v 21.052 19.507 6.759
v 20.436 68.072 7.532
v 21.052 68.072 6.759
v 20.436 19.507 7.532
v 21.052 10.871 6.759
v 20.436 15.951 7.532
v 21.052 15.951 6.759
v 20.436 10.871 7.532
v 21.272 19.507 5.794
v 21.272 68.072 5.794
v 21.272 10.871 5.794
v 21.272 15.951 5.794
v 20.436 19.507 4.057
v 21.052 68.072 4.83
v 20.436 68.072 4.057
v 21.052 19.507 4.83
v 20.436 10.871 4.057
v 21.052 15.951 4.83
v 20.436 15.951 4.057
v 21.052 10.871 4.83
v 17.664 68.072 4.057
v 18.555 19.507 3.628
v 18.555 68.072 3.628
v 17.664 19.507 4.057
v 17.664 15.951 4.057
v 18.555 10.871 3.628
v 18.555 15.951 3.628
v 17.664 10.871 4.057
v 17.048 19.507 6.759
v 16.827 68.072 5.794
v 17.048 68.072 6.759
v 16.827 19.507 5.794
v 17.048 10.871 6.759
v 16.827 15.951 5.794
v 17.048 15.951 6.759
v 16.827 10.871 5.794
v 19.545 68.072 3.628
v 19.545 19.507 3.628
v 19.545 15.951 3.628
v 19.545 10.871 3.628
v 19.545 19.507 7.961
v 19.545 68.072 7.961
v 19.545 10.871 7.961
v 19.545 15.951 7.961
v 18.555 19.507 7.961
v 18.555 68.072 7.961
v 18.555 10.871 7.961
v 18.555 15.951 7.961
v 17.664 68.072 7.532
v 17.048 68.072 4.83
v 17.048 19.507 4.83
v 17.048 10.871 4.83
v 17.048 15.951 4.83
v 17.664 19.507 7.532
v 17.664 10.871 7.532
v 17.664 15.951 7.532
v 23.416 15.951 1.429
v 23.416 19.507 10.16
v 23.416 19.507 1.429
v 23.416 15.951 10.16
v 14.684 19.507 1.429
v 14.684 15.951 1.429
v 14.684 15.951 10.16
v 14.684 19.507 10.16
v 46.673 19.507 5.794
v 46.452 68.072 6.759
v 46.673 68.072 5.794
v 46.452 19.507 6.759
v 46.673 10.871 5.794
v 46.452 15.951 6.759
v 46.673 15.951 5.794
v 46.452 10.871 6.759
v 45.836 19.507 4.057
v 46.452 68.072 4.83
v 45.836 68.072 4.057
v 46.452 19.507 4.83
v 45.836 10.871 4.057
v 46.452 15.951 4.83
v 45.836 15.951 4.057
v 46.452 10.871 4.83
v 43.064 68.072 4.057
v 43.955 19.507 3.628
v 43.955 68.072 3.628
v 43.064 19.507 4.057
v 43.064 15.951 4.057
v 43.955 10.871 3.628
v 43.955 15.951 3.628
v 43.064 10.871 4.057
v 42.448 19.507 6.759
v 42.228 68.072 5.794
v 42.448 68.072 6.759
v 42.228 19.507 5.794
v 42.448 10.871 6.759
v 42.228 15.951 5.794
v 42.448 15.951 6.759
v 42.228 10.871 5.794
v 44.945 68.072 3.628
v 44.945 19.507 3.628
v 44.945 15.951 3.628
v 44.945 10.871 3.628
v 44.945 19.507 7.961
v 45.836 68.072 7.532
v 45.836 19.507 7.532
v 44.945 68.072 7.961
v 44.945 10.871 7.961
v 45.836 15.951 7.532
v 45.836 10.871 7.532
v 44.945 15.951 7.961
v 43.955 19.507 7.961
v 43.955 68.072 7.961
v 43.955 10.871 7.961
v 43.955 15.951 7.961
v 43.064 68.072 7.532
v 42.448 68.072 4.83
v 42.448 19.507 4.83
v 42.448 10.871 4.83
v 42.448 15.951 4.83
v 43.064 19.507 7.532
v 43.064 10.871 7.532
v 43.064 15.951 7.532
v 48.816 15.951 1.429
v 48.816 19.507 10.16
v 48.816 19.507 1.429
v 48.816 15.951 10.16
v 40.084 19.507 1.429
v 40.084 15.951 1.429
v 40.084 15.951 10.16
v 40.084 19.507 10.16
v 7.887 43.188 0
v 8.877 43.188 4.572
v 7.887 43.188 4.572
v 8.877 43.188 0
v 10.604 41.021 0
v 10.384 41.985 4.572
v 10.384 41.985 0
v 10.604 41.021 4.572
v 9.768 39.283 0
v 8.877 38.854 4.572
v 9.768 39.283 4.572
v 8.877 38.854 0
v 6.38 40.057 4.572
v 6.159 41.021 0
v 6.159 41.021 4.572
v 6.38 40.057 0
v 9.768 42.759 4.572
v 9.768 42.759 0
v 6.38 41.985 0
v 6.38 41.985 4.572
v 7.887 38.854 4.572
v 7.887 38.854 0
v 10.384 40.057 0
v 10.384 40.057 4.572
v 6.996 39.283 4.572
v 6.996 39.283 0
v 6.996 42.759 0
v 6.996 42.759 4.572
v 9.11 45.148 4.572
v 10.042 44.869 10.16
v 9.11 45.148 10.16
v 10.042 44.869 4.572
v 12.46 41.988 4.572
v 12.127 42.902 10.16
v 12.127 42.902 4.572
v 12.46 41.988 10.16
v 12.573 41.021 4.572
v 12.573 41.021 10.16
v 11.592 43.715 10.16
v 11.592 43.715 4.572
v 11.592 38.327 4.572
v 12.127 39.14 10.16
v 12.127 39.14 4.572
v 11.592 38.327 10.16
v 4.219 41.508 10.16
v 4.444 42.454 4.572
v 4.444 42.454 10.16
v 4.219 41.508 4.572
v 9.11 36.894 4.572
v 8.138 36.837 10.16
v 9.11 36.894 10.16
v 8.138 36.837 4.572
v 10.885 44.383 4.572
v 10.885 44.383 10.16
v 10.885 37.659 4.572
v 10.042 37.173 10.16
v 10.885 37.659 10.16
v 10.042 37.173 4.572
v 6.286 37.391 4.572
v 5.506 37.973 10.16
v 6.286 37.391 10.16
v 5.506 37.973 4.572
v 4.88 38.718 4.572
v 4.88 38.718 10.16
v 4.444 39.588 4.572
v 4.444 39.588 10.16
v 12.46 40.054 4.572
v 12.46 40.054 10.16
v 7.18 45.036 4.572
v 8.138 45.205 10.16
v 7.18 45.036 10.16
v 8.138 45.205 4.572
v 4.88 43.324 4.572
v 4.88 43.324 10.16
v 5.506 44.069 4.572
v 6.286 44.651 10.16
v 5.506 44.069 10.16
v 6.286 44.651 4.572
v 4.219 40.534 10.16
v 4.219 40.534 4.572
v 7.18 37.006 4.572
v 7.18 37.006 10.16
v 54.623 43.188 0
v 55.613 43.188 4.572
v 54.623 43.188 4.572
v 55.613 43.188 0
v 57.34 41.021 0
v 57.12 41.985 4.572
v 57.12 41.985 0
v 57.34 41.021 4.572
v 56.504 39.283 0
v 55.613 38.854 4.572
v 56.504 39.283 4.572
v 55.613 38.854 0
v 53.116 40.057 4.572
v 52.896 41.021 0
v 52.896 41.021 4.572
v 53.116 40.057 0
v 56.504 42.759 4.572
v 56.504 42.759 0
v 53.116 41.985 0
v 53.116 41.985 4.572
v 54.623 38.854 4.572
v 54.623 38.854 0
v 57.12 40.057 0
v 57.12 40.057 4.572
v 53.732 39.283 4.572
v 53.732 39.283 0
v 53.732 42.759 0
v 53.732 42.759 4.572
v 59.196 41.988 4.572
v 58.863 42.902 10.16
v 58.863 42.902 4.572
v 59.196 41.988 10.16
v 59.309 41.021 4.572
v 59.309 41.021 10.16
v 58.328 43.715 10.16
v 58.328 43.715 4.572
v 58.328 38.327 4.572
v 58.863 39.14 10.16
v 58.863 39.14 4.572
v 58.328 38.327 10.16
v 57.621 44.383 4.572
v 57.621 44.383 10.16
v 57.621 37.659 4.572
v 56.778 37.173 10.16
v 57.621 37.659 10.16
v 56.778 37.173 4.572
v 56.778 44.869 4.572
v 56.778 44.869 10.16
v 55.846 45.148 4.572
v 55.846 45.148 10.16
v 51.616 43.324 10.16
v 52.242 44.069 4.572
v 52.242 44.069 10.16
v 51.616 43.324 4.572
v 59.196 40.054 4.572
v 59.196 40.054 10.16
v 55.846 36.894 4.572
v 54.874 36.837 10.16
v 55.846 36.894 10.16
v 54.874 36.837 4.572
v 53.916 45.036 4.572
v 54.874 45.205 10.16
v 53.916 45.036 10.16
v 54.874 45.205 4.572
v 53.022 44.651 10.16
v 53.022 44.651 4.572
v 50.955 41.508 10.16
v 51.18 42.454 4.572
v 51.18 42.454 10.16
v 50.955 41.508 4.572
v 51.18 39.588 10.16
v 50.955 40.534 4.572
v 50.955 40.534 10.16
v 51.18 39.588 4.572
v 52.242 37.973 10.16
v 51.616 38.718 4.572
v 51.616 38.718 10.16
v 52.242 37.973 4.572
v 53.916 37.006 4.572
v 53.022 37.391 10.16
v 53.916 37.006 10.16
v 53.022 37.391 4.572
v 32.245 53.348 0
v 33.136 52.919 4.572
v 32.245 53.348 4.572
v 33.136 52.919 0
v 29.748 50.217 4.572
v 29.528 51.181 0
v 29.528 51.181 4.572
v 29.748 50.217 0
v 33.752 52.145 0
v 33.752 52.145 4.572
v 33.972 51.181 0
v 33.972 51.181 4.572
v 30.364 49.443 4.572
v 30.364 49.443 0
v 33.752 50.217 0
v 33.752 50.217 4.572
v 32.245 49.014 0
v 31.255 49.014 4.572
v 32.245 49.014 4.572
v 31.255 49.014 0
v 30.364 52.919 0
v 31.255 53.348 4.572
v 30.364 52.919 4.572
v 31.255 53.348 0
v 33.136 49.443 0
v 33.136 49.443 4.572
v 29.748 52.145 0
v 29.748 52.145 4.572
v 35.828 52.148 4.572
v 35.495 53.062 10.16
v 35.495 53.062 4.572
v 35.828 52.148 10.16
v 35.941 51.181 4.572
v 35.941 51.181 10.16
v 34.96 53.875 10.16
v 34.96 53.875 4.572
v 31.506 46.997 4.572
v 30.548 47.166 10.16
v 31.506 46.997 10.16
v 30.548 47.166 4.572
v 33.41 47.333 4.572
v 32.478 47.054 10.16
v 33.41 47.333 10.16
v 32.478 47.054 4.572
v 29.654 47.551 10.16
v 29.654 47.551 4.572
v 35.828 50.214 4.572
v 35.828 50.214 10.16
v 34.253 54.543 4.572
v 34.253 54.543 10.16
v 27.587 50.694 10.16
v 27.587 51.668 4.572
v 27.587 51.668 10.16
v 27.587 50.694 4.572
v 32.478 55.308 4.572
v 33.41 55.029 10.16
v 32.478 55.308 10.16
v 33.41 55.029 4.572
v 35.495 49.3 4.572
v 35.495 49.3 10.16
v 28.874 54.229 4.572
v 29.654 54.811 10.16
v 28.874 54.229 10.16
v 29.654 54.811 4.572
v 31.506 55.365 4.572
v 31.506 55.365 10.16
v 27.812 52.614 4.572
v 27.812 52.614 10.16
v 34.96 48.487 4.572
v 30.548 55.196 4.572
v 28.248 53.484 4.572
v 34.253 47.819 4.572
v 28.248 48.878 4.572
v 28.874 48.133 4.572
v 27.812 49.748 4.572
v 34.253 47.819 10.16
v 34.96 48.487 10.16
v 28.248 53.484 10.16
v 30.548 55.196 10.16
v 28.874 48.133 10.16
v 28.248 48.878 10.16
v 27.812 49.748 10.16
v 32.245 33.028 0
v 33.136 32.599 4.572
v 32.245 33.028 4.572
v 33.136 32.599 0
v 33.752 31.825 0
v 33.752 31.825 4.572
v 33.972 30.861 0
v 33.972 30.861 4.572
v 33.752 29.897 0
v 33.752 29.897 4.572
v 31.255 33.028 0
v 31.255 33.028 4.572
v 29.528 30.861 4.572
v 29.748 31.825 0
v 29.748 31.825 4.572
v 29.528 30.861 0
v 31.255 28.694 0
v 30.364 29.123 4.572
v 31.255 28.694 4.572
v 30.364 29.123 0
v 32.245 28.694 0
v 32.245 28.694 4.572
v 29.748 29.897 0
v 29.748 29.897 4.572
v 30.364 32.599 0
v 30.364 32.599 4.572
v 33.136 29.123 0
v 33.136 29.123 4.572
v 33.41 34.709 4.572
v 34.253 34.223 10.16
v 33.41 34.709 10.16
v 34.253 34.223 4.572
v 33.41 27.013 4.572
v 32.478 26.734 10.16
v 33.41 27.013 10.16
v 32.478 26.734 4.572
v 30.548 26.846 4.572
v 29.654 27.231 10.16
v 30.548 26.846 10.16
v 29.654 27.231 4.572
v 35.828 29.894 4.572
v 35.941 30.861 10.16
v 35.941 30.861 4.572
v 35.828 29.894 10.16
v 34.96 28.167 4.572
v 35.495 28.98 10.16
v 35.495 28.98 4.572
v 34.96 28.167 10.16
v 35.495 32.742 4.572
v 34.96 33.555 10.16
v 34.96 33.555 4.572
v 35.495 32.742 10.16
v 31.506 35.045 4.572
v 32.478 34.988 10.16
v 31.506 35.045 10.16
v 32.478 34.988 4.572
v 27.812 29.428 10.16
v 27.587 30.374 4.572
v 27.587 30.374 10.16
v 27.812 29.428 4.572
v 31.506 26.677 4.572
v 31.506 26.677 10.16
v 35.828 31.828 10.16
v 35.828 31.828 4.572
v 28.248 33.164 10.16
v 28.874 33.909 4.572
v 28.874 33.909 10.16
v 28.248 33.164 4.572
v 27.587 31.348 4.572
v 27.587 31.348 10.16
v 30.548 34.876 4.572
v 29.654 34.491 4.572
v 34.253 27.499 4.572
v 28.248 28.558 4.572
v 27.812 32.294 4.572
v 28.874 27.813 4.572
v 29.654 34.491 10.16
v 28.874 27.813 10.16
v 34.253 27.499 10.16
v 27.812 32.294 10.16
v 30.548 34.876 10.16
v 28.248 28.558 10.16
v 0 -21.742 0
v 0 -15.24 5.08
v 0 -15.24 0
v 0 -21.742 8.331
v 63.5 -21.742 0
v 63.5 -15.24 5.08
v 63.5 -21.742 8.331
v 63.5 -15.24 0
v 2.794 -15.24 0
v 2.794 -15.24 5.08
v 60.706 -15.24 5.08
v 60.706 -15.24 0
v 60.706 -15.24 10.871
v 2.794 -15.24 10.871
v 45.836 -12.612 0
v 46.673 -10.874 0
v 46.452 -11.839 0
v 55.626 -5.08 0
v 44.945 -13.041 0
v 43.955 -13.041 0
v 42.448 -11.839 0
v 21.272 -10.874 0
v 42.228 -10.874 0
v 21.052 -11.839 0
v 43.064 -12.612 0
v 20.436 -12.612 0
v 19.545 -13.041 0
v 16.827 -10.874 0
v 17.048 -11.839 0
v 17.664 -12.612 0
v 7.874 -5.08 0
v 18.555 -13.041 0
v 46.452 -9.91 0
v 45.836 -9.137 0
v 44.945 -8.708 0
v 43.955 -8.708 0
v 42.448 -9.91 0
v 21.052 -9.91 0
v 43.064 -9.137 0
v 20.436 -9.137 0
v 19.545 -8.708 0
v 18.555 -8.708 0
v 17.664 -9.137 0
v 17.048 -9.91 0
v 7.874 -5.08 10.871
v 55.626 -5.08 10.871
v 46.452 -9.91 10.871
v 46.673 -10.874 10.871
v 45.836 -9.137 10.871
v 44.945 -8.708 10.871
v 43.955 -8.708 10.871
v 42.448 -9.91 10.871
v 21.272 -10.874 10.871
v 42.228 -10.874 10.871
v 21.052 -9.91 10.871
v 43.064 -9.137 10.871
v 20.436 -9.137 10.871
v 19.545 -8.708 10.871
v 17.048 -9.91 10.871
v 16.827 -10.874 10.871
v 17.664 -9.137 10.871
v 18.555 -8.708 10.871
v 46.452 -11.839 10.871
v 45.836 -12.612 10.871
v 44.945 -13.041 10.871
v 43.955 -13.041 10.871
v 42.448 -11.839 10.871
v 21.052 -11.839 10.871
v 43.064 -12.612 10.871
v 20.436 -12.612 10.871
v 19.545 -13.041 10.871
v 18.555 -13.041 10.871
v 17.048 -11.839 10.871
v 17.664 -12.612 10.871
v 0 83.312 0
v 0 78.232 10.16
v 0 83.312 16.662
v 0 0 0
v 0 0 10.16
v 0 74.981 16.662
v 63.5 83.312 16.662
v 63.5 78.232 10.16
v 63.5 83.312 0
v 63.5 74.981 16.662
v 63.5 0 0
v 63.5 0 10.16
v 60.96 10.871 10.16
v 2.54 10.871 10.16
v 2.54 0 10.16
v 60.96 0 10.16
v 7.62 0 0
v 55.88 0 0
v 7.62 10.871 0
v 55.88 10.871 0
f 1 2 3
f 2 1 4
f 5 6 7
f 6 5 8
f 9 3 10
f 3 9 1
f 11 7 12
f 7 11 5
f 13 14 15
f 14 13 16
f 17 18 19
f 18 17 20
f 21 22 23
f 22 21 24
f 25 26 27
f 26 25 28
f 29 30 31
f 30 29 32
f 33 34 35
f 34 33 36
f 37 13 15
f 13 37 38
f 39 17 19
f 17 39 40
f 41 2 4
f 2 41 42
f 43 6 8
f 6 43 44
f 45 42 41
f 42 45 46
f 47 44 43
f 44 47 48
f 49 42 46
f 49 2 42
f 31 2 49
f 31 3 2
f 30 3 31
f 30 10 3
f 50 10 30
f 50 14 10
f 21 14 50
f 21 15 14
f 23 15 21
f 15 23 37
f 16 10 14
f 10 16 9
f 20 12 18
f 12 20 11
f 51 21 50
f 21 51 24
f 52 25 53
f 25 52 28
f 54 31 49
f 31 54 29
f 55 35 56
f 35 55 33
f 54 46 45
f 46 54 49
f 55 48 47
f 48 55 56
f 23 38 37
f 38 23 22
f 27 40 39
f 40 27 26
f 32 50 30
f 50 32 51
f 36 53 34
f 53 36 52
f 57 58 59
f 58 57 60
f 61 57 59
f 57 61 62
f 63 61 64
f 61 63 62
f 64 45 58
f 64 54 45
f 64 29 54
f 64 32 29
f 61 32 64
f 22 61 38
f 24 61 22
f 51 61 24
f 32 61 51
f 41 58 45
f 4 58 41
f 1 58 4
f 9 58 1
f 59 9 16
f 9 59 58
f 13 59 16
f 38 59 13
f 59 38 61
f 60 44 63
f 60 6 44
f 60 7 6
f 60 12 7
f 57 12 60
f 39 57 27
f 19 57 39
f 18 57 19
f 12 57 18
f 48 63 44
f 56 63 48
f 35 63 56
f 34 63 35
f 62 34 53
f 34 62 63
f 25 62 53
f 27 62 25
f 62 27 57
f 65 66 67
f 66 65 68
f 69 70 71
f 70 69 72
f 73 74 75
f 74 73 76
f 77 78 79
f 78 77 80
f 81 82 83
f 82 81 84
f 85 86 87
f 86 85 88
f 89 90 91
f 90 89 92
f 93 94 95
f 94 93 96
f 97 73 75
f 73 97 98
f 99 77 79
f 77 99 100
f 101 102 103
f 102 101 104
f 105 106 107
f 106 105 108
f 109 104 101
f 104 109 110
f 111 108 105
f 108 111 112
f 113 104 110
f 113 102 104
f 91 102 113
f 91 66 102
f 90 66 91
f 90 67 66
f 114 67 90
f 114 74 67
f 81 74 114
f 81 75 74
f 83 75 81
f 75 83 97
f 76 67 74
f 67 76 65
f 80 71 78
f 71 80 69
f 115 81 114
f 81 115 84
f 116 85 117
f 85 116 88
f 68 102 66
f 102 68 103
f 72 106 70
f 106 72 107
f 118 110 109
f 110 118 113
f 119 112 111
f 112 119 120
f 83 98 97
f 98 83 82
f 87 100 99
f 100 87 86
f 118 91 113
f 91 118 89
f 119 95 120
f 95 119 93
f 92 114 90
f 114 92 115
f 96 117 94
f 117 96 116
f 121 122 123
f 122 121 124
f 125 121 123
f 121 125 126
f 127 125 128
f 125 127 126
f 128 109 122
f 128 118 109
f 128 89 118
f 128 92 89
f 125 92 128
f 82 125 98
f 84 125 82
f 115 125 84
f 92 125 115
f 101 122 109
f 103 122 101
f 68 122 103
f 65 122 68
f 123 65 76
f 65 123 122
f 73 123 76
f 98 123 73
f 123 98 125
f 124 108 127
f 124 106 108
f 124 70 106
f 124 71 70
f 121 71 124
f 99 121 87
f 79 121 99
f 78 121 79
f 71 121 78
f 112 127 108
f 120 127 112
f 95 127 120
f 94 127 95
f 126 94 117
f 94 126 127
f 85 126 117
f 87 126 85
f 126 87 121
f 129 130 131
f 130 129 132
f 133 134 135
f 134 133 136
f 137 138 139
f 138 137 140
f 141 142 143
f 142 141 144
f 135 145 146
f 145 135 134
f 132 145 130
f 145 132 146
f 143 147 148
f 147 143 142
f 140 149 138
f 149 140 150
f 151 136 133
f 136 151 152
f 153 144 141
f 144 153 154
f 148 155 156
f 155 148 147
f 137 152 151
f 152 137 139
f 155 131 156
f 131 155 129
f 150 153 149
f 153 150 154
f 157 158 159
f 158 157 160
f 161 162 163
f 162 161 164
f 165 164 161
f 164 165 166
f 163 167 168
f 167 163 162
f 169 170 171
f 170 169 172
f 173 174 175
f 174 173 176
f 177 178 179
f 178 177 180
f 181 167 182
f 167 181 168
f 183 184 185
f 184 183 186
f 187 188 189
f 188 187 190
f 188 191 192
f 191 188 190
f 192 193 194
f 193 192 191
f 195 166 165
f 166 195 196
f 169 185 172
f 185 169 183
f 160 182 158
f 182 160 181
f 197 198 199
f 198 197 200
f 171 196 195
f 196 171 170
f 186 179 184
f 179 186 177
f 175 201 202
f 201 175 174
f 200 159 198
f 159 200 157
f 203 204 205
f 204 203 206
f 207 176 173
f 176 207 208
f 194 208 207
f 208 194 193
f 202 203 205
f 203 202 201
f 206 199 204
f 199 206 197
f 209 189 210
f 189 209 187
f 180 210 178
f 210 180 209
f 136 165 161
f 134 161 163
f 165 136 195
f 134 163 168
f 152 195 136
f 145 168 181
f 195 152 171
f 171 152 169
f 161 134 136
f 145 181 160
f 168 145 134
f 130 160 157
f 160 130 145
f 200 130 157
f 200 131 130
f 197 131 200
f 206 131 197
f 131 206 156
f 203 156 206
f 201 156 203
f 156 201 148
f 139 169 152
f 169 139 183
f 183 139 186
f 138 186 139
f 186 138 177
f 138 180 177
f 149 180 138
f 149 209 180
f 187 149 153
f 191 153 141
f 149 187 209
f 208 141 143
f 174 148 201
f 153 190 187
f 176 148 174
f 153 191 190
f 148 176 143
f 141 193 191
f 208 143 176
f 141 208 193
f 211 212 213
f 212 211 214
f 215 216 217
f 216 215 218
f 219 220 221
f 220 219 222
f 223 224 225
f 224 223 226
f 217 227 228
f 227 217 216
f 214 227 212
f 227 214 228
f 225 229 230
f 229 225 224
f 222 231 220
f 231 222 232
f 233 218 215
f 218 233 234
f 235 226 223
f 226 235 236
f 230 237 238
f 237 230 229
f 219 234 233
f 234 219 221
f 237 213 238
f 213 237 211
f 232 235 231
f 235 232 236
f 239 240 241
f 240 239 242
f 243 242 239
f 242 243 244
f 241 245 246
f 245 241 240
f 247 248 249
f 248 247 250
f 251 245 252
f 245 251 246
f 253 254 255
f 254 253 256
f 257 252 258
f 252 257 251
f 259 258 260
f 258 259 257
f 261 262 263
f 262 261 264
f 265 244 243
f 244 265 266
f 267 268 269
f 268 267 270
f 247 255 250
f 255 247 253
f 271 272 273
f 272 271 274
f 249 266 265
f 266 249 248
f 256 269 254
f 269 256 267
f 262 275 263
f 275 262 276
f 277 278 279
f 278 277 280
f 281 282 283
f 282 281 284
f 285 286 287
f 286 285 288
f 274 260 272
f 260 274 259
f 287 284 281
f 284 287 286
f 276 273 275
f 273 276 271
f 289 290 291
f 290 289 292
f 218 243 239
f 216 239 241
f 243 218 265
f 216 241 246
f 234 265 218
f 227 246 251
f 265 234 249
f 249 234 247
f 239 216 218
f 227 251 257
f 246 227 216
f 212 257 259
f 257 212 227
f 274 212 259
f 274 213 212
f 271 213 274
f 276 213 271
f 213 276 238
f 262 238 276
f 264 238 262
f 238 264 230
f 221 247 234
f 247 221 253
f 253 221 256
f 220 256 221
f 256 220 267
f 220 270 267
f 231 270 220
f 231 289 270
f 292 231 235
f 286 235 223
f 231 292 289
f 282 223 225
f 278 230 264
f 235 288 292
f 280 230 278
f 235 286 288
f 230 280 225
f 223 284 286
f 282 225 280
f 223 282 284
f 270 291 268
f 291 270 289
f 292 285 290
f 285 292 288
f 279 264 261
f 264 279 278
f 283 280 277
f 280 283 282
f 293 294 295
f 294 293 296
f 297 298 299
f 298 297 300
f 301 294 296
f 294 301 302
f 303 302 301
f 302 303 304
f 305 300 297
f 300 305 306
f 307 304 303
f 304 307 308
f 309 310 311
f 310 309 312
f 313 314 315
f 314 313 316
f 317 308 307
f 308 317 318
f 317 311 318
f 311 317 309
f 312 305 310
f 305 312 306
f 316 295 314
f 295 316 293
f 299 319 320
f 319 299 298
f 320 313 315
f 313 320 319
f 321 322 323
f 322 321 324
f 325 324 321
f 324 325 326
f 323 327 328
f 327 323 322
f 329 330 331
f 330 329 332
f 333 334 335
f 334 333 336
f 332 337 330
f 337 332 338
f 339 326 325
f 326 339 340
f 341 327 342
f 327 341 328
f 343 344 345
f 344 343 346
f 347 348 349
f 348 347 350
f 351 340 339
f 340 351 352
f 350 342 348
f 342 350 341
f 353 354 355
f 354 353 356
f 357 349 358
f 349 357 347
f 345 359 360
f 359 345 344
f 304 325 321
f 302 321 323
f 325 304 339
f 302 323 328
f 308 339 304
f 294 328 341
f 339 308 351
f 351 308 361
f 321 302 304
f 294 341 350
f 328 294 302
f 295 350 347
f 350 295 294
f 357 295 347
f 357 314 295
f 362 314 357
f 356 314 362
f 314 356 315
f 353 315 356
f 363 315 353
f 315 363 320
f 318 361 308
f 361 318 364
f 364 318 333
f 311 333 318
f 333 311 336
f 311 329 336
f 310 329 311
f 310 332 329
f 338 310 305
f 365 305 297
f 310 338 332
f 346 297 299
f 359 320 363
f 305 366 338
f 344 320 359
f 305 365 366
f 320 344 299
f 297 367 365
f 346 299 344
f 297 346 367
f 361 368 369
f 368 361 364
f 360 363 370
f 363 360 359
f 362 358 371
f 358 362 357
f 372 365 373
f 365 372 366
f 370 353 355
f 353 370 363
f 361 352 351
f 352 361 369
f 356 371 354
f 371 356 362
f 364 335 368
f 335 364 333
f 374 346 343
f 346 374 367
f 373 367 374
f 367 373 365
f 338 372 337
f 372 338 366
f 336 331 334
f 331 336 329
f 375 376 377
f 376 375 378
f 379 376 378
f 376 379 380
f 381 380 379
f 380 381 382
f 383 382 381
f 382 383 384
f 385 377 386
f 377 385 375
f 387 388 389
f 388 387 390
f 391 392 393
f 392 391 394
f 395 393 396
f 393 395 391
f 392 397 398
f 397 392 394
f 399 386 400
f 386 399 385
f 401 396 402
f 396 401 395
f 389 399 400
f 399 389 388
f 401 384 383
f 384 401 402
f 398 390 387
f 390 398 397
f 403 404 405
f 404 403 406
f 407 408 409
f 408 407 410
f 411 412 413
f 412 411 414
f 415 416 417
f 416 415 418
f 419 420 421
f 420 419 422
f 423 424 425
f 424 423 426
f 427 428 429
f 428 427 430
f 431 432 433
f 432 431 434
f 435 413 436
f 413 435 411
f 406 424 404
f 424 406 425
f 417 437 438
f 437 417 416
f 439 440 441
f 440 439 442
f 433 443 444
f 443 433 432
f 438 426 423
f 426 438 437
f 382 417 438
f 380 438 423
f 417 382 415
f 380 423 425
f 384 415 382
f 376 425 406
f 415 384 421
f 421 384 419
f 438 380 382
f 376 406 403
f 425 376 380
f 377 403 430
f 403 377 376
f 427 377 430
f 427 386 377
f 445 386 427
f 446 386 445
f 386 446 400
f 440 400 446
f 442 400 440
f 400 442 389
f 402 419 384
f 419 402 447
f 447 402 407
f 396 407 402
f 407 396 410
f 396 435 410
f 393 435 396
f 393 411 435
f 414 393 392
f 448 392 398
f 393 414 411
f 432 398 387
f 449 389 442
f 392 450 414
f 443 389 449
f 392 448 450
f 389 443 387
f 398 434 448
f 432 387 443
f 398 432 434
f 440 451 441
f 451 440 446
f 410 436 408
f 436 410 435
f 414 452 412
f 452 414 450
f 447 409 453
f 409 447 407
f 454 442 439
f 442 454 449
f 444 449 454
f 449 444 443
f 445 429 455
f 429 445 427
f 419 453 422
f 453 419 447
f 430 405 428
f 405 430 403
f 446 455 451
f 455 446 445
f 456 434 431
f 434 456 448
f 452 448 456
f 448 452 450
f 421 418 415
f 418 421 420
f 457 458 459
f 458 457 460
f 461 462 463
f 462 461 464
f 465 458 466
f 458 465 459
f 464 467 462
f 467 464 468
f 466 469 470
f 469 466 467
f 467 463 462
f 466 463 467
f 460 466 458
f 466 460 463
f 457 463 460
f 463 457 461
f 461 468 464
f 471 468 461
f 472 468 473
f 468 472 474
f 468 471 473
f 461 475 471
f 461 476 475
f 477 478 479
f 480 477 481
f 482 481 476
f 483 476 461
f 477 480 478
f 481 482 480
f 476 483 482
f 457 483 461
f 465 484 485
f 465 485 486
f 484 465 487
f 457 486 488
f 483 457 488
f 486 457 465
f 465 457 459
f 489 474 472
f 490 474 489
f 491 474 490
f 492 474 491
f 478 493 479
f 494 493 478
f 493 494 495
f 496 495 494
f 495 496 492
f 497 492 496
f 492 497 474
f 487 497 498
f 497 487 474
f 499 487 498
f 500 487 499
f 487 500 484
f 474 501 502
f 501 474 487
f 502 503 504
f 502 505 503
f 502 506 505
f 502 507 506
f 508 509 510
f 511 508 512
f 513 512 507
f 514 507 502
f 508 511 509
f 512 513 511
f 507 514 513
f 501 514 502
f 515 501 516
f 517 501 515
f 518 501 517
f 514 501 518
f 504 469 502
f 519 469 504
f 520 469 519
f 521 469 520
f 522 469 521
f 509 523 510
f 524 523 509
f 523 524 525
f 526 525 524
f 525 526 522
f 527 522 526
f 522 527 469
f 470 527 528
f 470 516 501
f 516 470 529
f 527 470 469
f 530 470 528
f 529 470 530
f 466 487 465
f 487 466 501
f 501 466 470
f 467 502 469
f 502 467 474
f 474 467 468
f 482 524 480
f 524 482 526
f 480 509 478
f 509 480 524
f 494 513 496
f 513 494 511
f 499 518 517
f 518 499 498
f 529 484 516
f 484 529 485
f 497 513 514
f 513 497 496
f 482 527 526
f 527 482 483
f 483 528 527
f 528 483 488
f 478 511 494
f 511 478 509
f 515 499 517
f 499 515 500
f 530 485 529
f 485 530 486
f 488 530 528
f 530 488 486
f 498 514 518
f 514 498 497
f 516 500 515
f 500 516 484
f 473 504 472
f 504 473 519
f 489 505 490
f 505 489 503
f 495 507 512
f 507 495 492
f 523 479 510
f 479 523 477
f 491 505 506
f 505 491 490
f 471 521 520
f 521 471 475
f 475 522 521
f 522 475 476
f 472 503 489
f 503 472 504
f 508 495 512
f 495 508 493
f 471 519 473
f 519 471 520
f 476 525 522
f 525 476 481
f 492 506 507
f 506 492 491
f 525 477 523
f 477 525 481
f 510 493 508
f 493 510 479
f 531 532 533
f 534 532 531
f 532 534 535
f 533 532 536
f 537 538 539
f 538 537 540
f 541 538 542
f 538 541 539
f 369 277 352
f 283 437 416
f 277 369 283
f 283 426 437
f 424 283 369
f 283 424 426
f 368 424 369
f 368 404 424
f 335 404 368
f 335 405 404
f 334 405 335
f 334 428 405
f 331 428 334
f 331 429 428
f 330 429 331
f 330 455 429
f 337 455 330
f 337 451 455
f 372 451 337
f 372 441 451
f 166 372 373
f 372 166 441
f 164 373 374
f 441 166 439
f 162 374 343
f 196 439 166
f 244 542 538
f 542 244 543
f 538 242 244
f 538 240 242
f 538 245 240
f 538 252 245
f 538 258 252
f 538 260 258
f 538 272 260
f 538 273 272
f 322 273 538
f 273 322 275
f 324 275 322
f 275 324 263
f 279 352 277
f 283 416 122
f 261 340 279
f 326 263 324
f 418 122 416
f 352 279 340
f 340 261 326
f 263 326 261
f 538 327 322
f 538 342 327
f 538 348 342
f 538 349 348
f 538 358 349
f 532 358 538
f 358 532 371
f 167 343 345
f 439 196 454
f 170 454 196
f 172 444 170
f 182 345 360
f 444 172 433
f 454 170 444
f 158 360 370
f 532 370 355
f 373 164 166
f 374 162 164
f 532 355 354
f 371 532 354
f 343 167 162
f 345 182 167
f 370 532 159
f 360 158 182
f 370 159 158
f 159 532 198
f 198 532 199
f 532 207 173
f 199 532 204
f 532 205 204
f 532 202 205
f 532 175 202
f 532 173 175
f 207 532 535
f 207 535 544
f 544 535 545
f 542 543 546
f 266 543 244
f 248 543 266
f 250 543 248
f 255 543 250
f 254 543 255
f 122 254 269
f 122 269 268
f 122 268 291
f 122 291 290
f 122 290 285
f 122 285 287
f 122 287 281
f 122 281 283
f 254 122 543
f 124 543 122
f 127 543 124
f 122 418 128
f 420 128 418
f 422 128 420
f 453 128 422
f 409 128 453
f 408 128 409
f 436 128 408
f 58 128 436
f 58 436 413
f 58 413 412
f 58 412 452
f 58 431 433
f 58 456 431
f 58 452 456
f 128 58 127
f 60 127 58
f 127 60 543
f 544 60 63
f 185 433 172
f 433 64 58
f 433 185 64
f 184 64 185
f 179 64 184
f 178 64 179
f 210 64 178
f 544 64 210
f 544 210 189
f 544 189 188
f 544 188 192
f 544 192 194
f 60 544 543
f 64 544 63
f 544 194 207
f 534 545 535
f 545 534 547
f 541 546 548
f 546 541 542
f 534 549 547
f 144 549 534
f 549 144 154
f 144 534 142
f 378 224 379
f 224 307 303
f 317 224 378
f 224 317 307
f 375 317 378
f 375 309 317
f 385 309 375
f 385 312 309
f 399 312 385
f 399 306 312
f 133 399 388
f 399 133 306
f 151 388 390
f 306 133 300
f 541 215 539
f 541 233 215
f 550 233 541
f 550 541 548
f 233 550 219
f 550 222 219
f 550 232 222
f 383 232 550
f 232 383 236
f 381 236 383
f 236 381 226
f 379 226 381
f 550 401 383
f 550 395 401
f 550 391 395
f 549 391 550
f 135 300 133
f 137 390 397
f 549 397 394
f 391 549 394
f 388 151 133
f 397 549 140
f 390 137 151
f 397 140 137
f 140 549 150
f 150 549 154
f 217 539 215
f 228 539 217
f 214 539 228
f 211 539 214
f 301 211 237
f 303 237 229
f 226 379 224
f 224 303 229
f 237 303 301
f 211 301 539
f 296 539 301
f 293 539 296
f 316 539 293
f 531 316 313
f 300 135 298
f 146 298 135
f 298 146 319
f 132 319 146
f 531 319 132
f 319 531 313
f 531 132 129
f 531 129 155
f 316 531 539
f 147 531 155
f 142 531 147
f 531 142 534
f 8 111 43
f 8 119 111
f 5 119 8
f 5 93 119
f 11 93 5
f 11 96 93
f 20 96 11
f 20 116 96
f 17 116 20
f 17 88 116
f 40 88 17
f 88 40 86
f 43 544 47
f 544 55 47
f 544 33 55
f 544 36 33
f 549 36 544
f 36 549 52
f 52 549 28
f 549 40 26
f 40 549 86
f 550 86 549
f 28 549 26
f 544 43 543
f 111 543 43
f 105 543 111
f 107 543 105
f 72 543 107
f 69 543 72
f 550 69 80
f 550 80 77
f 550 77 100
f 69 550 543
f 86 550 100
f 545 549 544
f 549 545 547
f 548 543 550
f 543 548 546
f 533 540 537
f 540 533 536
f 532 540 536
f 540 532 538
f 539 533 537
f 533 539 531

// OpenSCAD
//////////////////////////////////////////////////////
// Vixen-style dovetail clamp
//
// Designed for attached relatively light-weight 
// equipment, like a finder or guide scope, to a
// Vixen-style dovetail plate.  
//
// The length of the clamp is set by the clamp_length
// parameter.  Counterbored screw holes for equipment
// attachment are specified in the screw_holes[] 
// vector.  
// 
// The various holes are sized for US #8 machine screw 
// hardware.  The holes are intended to be snug to 
// minimize free play. 
//
// This design should be adaptable to Losmandy-style 
// plates by suitably modifying the dovetail bar
// parameters.
//////////////////////////////////////////////////////
// (c) 2018 Les Niles
// This design is licensed under the Creative Commons 
// Attribution license http://creativecommons.org/licenses/by/4.0/

// Dimension parameters
mm = 1.0;
inches = 25.4*mm;

clamp_length = 2.5*inches; // Overall length of the dovetail clamp to print

// The following is an array of screw hole locations. A counterbored screw hole will be  
// created at each location. Each item in the array is an x,y pair, where x is the
// distance from one end of the clamp and y is the distance from the centerline.
screw_holes = [[0.33*inches, 0], [clamp_length-0.33*inches, 0], [clamp_length/2, 0.4*inches], 
                [clamp_length/2, -0.4*inches]];

// #8 machine screw hardware
screw_dia = 0.175*inches; // Sets diameter of screw holes
screw_head_thick = 0.22*inches; // Sets depth of counterbore
screw_head_dia = 0.33*inches;  // Sets diameter of counterbore
nut_dia = (11/32)*inches; // Sets depth and width of nut pocket
nut_thick = 0.14*inches;  // Sets thickness of nut pocket

// Vixen dovetail bar dimensions.  It should be possible to adjust for other types of dovetails
// by changing these parameters.
bar_width = 2.88*inches;  // Width of the dovetail bar at its base, less 0.04" -- the difference 
                         // ensures that the clamp won't bottom out. 
bar_depth = .256*inches;  // Thickness of the dovetail bar
clamp_angle = 30;   // The angle of each side of the dovetail bar, in degrees  15 degrees is too low but does do the job but increase to 30 which seems more accurate when measured. 
bar_offset = bar_depth*sin(clamp_angle);  // Amount a side of the dovetail bar angles in

// Parameters for this dovetail clamp
clamp_base_depth = 0.4*inches;  // Thickness of the clamp base
clamp_jaw_thick = 0.2*inches;  // Width of the jaw at its narrowest (the point where dovetail bar is widest)
clamp_end_thick = 0.1*inches;
jaw_thick = clamp_jaw_thick+bar_offset;   // Thickness of the jaw at its top
jaw_base_width = jaw_thick+0.1*inches;

clearance = 0.01*inches;    // A small gap between parts that move against each other

delta = 0.02*inches;  // A small amount for padding, e.g. to ensure that differences are complete

module V_clamp(length) {
    rotate([90,0,90]) {
        linear_extrude(height = length) {
            polygon([[0,0], [0, clamp_base_depth+bar_depth], 
                    [clamp_jaw_thick+bar_offset, clamp_base_depth+bar_depth],
                    [clamp_jaw_thick, clamp_base_depth], 
                    [clamp_jaw_thick+bar_width, clamp_base_depth], 
                    [clamp_jaw_thick+bar_width-bar_offset, clamp_base_depth+bar_depth],
                    [2*clamp_jaw_thick+bar_width, clamp_base_depth+bar_depth], 
                    [2*clamp_jaw_thick+bar_width, 0],
                    [0,0]]);
        }
    }
}
        
module V_jaw(length) {
    rotate([90,0,90]) {
        linear_extrude(height = length) {
            polygon([[0,0], [0, clamp_base_depth+bar_depth], 
                    [clamp_jaw_thick+bar_offset, clamp_base_depth+bar_depth],
                    [clamp_jaw_thick, clamp_base_depth], 
                    [jaw_base_width, clamp_base_depth], 
                    [jaw_base_width, 0], [0,0]]);
        }
    }
}

module trimmed_jaw(extra=0) {
    difference() {
        V_jaw(clamp_length);
        end_trimmer(clamp_end_thick+extra);
        translate([clamp_length,0,0]) 
            mirror([1,0,0]) 
                end_trimmer(clamp_end_thick+extra);
    }
}

module end_trimmer(offset) {
    translate([0,bar_width+delta,0])
    rotate([90,0,0]) {
        linear_extrude(height = bar_width+2*delta) {
            polygon([[offset,clamp_base_depth], 
                    [-delta, clamp_base_depth], [-delta, -delta],
                    [offset+(clamp_base_depth+delta)/2, -delta]]);
        }
    }
}

module screw_holes() {
    // Two holes with nut pockets for the clamping screws
    union() {
        translate([0.3*clamp_length, bar_width-0.2*inches, clamp_base_depth-(nut_dia/2)])
            rotate([90,0,0]) cylinder(bar_width, d=screw_dia, $fs=1);
        translate([0.3*clamp_length-nut_dia/2, jaw_base_width+0.2*inches, clamp_base_depth-nut_dia])
            cube([nut_dia, nut_thick, nut_dia+delta]);
    }
    union() {
        translate([0.7*clamp_length, bar_width-0.2*inches, clamp_base_depth-(nut_dia/2)])
            rotate([90,0,0]) cylinder(bar_width, d=screw_dia, $fs=1);
        translate([0.7*clamp_length-nut_dia/2, jaw_base_width+0.2*inches, clamp_base_depth-nut_dia])
            cube([nut_dia, nut_thick, nut_dia+delta]);
    }
    
    // Counterbored holes for attachment to this dovetail mount
    centerline = bar_width/2+clamp_jaw_thick-0.025*inches;
    for (h = screw_holes) {
        union() {
            translate([h[0], centerline+h[1], -delta]) {
                cylinder(clamp_base_depth+2*delta, d=screw_dia, $fs=1);
            }
            translate([h[0], centerline+h[1], clamp_base_depth-screw_head_thick]) {
                cylinder(screw_head_thick+delta, d=screw_head_dia, $fs=1);
            }
        }
    }           
}


 
translate([0,-0.2*inches,0]) {
    rotate([90,0,0]) 
        difference() {
            trimmed_jaw(clearance);
            screw_holes();
        }
}

difference() {
    V_clamp(clamp_length);
    trimmed_jaw(0);
    screw_holes();
}
